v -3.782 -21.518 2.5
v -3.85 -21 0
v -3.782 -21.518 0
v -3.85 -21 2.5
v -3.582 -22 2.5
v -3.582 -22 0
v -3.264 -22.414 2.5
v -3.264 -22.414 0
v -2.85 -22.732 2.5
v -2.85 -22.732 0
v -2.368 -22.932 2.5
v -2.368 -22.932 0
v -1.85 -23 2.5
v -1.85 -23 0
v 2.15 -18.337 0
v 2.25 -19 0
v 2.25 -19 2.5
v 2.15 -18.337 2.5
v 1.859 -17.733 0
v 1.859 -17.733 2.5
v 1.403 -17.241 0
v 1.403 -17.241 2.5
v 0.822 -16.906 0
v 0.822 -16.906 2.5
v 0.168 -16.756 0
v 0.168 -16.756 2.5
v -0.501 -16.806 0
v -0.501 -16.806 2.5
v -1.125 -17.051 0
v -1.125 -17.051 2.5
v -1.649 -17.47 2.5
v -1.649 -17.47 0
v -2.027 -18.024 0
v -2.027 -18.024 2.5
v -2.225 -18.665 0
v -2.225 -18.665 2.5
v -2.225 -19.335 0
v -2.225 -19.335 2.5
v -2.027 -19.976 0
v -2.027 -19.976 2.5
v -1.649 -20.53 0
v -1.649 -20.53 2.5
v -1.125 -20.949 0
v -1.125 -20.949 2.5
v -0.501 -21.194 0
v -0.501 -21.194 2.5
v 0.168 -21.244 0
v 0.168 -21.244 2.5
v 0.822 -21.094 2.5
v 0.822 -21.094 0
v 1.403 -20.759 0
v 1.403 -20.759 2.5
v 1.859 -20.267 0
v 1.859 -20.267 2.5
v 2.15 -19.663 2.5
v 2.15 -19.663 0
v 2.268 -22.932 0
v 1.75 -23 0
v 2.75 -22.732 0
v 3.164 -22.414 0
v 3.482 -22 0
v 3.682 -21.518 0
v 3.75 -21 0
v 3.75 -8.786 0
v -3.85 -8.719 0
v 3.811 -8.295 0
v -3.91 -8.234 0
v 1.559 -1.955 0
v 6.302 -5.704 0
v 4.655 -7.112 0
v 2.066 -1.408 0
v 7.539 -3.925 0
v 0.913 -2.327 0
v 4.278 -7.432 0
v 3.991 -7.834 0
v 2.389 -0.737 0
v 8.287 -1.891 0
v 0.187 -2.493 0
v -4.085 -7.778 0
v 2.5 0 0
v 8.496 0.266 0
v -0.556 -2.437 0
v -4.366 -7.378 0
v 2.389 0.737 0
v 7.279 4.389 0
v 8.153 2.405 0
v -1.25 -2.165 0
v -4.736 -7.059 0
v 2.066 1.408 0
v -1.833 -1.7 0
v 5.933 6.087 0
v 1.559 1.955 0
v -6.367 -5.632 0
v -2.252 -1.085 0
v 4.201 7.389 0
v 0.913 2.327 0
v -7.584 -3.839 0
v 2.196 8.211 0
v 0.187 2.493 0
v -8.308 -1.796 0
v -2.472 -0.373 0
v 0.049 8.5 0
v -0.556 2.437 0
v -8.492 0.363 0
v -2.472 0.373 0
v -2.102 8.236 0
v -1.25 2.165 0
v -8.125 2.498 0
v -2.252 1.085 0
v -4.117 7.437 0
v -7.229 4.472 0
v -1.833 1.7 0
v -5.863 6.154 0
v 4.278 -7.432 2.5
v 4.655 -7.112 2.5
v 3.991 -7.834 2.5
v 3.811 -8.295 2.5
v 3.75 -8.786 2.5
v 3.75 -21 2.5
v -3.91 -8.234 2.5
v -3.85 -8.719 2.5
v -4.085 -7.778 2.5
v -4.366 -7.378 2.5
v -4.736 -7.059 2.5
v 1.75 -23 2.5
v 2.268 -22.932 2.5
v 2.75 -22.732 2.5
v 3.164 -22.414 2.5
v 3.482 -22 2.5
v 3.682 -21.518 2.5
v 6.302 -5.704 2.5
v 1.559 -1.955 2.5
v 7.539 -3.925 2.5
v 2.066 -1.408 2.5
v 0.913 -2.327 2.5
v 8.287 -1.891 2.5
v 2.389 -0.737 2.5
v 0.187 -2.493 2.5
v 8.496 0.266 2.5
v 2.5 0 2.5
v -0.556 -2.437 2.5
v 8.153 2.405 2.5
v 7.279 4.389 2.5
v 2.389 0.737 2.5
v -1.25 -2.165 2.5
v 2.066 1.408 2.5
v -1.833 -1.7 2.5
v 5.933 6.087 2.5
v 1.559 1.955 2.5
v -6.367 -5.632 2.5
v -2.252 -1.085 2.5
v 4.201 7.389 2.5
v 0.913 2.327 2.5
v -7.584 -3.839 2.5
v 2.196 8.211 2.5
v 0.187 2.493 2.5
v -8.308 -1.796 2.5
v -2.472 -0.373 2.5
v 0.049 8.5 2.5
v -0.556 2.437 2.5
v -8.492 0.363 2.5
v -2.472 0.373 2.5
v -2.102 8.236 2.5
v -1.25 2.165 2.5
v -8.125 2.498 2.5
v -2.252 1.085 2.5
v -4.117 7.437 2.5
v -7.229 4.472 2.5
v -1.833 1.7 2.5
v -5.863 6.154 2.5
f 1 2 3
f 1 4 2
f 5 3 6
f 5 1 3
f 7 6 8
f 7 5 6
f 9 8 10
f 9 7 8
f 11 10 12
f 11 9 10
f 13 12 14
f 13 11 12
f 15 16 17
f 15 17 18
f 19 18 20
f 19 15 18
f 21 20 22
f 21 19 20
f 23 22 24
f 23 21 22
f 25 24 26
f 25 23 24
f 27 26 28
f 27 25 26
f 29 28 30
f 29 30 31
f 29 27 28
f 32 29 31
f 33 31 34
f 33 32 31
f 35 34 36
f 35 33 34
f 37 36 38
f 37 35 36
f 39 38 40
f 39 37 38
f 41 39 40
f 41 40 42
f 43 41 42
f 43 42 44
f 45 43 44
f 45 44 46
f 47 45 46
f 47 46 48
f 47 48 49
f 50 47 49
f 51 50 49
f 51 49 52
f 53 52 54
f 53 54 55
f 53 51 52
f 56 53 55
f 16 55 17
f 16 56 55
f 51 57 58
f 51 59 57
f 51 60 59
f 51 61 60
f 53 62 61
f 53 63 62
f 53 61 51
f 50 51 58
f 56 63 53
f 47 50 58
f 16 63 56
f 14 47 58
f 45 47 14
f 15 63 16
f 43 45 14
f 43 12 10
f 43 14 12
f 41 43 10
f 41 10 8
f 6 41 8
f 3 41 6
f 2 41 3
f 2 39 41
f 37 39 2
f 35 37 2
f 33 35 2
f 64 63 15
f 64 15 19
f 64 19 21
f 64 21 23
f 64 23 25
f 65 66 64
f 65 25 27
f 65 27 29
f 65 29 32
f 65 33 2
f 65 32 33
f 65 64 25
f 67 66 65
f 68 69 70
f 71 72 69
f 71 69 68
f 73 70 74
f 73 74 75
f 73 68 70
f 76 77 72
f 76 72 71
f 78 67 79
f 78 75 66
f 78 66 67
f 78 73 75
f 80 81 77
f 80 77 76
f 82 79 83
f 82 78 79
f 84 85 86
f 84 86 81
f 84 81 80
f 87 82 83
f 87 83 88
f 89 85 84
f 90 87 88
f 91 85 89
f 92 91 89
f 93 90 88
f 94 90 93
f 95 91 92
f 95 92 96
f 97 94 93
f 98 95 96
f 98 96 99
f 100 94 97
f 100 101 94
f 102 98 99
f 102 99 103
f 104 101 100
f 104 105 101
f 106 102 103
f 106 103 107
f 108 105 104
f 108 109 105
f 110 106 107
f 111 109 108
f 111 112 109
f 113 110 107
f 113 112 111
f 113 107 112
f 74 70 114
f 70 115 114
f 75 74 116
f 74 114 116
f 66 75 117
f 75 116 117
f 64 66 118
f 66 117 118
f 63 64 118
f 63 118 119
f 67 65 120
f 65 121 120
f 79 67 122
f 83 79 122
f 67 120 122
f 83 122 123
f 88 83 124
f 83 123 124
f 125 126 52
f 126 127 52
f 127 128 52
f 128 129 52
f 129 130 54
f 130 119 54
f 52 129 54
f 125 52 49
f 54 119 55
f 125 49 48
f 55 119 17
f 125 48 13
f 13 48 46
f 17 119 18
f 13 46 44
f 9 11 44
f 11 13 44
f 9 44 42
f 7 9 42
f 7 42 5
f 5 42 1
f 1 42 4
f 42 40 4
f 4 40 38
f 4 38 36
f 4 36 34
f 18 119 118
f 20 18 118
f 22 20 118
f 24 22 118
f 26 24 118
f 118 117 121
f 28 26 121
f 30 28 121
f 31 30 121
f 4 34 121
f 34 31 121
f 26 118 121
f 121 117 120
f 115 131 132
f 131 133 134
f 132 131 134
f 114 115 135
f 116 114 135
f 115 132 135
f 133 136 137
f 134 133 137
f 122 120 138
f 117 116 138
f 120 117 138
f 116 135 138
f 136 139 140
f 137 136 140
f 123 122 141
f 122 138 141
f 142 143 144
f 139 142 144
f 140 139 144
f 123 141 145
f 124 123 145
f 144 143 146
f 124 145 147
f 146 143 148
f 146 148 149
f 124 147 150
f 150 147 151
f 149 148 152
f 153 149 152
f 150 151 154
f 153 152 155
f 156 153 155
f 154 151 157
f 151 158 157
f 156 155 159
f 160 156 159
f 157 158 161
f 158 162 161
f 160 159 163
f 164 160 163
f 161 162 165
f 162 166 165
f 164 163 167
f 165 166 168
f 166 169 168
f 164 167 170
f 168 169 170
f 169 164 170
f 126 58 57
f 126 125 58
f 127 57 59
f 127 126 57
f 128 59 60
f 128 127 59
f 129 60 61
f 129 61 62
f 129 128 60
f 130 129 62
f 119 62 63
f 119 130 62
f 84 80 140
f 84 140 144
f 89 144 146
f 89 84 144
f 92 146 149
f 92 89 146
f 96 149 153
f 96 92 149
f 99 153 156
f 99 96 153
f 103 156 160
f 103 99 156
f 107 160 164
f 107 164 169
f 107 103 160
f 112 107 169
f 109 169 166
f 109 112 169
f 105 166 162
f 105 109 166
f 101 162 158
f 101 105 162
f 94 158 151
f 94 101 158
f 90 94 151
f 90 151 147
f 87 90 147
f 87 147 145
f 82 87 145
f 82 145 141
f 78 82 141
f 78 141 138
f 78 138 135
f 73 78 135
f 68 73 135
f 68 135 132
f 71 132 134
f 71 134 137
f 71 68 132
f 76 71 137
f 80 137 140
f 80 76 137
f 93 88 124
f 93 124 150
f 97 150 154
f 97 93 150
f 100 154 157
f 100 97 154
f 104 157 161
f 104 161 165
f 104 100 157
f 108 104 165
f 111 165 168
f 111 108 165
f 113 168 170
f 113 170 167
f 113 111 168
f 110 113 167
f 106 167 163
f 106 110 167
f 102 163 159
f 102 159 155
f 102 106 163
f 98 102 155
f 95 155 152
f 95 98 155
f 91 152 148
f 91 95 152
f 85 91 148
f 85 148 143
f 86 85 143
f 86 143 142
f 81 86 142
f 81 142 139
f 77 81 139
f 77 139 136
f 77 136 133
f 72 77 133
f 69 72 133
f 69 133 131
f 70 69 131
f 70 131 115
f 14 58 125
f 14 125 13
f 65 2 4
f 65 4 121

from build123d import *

# Parameters (mm, degrees)
SKETCH_1_R      = 2.5
SKETCH_1_R_2    = 2.25
EXTRUDE_1_DEPTH = 2.5
FILLET_1_R      = 2


with BuildPart() as part:
    # 草图1 → 拉伸1 (new body)
    with BuildSketch(Plane.XY):
        with BuildLine():
            Line((-3.85, -23), (-3.85, -7.578093428))
            ThreePointArc((-3.85, -7.578093428), (0.055897166, 8.499816204), (3.75, -7.628073151))
            Line((3.75, -7.628073151), (3.75, -23))
            Line((3.75, -23), (-3.85, -23))
        make_face()
        Circle(SKETCH_1_R, mode=Mode.SUBTRACT)
        with Locations((0, -19)):
            Circle(SKETCH_1_R_2, mode=Mode.SUBTRACT)
    extrude(amount=EXTRUDE_1_DEPTH)

    # 圆角1
    fillet_1_edges = [part.edges().sort_by_distance(p)[0] for p in [
        (-3.85, -23, 1.25),
        (-3.85, -7.578093428, 1.25),
        (3.75, -7.628073151, 1.25),
        (3.75, -23, 1.25),
    ]]
    fillet(fillet_1_edges, radius=FILLET_1_R)


solid = part.part
